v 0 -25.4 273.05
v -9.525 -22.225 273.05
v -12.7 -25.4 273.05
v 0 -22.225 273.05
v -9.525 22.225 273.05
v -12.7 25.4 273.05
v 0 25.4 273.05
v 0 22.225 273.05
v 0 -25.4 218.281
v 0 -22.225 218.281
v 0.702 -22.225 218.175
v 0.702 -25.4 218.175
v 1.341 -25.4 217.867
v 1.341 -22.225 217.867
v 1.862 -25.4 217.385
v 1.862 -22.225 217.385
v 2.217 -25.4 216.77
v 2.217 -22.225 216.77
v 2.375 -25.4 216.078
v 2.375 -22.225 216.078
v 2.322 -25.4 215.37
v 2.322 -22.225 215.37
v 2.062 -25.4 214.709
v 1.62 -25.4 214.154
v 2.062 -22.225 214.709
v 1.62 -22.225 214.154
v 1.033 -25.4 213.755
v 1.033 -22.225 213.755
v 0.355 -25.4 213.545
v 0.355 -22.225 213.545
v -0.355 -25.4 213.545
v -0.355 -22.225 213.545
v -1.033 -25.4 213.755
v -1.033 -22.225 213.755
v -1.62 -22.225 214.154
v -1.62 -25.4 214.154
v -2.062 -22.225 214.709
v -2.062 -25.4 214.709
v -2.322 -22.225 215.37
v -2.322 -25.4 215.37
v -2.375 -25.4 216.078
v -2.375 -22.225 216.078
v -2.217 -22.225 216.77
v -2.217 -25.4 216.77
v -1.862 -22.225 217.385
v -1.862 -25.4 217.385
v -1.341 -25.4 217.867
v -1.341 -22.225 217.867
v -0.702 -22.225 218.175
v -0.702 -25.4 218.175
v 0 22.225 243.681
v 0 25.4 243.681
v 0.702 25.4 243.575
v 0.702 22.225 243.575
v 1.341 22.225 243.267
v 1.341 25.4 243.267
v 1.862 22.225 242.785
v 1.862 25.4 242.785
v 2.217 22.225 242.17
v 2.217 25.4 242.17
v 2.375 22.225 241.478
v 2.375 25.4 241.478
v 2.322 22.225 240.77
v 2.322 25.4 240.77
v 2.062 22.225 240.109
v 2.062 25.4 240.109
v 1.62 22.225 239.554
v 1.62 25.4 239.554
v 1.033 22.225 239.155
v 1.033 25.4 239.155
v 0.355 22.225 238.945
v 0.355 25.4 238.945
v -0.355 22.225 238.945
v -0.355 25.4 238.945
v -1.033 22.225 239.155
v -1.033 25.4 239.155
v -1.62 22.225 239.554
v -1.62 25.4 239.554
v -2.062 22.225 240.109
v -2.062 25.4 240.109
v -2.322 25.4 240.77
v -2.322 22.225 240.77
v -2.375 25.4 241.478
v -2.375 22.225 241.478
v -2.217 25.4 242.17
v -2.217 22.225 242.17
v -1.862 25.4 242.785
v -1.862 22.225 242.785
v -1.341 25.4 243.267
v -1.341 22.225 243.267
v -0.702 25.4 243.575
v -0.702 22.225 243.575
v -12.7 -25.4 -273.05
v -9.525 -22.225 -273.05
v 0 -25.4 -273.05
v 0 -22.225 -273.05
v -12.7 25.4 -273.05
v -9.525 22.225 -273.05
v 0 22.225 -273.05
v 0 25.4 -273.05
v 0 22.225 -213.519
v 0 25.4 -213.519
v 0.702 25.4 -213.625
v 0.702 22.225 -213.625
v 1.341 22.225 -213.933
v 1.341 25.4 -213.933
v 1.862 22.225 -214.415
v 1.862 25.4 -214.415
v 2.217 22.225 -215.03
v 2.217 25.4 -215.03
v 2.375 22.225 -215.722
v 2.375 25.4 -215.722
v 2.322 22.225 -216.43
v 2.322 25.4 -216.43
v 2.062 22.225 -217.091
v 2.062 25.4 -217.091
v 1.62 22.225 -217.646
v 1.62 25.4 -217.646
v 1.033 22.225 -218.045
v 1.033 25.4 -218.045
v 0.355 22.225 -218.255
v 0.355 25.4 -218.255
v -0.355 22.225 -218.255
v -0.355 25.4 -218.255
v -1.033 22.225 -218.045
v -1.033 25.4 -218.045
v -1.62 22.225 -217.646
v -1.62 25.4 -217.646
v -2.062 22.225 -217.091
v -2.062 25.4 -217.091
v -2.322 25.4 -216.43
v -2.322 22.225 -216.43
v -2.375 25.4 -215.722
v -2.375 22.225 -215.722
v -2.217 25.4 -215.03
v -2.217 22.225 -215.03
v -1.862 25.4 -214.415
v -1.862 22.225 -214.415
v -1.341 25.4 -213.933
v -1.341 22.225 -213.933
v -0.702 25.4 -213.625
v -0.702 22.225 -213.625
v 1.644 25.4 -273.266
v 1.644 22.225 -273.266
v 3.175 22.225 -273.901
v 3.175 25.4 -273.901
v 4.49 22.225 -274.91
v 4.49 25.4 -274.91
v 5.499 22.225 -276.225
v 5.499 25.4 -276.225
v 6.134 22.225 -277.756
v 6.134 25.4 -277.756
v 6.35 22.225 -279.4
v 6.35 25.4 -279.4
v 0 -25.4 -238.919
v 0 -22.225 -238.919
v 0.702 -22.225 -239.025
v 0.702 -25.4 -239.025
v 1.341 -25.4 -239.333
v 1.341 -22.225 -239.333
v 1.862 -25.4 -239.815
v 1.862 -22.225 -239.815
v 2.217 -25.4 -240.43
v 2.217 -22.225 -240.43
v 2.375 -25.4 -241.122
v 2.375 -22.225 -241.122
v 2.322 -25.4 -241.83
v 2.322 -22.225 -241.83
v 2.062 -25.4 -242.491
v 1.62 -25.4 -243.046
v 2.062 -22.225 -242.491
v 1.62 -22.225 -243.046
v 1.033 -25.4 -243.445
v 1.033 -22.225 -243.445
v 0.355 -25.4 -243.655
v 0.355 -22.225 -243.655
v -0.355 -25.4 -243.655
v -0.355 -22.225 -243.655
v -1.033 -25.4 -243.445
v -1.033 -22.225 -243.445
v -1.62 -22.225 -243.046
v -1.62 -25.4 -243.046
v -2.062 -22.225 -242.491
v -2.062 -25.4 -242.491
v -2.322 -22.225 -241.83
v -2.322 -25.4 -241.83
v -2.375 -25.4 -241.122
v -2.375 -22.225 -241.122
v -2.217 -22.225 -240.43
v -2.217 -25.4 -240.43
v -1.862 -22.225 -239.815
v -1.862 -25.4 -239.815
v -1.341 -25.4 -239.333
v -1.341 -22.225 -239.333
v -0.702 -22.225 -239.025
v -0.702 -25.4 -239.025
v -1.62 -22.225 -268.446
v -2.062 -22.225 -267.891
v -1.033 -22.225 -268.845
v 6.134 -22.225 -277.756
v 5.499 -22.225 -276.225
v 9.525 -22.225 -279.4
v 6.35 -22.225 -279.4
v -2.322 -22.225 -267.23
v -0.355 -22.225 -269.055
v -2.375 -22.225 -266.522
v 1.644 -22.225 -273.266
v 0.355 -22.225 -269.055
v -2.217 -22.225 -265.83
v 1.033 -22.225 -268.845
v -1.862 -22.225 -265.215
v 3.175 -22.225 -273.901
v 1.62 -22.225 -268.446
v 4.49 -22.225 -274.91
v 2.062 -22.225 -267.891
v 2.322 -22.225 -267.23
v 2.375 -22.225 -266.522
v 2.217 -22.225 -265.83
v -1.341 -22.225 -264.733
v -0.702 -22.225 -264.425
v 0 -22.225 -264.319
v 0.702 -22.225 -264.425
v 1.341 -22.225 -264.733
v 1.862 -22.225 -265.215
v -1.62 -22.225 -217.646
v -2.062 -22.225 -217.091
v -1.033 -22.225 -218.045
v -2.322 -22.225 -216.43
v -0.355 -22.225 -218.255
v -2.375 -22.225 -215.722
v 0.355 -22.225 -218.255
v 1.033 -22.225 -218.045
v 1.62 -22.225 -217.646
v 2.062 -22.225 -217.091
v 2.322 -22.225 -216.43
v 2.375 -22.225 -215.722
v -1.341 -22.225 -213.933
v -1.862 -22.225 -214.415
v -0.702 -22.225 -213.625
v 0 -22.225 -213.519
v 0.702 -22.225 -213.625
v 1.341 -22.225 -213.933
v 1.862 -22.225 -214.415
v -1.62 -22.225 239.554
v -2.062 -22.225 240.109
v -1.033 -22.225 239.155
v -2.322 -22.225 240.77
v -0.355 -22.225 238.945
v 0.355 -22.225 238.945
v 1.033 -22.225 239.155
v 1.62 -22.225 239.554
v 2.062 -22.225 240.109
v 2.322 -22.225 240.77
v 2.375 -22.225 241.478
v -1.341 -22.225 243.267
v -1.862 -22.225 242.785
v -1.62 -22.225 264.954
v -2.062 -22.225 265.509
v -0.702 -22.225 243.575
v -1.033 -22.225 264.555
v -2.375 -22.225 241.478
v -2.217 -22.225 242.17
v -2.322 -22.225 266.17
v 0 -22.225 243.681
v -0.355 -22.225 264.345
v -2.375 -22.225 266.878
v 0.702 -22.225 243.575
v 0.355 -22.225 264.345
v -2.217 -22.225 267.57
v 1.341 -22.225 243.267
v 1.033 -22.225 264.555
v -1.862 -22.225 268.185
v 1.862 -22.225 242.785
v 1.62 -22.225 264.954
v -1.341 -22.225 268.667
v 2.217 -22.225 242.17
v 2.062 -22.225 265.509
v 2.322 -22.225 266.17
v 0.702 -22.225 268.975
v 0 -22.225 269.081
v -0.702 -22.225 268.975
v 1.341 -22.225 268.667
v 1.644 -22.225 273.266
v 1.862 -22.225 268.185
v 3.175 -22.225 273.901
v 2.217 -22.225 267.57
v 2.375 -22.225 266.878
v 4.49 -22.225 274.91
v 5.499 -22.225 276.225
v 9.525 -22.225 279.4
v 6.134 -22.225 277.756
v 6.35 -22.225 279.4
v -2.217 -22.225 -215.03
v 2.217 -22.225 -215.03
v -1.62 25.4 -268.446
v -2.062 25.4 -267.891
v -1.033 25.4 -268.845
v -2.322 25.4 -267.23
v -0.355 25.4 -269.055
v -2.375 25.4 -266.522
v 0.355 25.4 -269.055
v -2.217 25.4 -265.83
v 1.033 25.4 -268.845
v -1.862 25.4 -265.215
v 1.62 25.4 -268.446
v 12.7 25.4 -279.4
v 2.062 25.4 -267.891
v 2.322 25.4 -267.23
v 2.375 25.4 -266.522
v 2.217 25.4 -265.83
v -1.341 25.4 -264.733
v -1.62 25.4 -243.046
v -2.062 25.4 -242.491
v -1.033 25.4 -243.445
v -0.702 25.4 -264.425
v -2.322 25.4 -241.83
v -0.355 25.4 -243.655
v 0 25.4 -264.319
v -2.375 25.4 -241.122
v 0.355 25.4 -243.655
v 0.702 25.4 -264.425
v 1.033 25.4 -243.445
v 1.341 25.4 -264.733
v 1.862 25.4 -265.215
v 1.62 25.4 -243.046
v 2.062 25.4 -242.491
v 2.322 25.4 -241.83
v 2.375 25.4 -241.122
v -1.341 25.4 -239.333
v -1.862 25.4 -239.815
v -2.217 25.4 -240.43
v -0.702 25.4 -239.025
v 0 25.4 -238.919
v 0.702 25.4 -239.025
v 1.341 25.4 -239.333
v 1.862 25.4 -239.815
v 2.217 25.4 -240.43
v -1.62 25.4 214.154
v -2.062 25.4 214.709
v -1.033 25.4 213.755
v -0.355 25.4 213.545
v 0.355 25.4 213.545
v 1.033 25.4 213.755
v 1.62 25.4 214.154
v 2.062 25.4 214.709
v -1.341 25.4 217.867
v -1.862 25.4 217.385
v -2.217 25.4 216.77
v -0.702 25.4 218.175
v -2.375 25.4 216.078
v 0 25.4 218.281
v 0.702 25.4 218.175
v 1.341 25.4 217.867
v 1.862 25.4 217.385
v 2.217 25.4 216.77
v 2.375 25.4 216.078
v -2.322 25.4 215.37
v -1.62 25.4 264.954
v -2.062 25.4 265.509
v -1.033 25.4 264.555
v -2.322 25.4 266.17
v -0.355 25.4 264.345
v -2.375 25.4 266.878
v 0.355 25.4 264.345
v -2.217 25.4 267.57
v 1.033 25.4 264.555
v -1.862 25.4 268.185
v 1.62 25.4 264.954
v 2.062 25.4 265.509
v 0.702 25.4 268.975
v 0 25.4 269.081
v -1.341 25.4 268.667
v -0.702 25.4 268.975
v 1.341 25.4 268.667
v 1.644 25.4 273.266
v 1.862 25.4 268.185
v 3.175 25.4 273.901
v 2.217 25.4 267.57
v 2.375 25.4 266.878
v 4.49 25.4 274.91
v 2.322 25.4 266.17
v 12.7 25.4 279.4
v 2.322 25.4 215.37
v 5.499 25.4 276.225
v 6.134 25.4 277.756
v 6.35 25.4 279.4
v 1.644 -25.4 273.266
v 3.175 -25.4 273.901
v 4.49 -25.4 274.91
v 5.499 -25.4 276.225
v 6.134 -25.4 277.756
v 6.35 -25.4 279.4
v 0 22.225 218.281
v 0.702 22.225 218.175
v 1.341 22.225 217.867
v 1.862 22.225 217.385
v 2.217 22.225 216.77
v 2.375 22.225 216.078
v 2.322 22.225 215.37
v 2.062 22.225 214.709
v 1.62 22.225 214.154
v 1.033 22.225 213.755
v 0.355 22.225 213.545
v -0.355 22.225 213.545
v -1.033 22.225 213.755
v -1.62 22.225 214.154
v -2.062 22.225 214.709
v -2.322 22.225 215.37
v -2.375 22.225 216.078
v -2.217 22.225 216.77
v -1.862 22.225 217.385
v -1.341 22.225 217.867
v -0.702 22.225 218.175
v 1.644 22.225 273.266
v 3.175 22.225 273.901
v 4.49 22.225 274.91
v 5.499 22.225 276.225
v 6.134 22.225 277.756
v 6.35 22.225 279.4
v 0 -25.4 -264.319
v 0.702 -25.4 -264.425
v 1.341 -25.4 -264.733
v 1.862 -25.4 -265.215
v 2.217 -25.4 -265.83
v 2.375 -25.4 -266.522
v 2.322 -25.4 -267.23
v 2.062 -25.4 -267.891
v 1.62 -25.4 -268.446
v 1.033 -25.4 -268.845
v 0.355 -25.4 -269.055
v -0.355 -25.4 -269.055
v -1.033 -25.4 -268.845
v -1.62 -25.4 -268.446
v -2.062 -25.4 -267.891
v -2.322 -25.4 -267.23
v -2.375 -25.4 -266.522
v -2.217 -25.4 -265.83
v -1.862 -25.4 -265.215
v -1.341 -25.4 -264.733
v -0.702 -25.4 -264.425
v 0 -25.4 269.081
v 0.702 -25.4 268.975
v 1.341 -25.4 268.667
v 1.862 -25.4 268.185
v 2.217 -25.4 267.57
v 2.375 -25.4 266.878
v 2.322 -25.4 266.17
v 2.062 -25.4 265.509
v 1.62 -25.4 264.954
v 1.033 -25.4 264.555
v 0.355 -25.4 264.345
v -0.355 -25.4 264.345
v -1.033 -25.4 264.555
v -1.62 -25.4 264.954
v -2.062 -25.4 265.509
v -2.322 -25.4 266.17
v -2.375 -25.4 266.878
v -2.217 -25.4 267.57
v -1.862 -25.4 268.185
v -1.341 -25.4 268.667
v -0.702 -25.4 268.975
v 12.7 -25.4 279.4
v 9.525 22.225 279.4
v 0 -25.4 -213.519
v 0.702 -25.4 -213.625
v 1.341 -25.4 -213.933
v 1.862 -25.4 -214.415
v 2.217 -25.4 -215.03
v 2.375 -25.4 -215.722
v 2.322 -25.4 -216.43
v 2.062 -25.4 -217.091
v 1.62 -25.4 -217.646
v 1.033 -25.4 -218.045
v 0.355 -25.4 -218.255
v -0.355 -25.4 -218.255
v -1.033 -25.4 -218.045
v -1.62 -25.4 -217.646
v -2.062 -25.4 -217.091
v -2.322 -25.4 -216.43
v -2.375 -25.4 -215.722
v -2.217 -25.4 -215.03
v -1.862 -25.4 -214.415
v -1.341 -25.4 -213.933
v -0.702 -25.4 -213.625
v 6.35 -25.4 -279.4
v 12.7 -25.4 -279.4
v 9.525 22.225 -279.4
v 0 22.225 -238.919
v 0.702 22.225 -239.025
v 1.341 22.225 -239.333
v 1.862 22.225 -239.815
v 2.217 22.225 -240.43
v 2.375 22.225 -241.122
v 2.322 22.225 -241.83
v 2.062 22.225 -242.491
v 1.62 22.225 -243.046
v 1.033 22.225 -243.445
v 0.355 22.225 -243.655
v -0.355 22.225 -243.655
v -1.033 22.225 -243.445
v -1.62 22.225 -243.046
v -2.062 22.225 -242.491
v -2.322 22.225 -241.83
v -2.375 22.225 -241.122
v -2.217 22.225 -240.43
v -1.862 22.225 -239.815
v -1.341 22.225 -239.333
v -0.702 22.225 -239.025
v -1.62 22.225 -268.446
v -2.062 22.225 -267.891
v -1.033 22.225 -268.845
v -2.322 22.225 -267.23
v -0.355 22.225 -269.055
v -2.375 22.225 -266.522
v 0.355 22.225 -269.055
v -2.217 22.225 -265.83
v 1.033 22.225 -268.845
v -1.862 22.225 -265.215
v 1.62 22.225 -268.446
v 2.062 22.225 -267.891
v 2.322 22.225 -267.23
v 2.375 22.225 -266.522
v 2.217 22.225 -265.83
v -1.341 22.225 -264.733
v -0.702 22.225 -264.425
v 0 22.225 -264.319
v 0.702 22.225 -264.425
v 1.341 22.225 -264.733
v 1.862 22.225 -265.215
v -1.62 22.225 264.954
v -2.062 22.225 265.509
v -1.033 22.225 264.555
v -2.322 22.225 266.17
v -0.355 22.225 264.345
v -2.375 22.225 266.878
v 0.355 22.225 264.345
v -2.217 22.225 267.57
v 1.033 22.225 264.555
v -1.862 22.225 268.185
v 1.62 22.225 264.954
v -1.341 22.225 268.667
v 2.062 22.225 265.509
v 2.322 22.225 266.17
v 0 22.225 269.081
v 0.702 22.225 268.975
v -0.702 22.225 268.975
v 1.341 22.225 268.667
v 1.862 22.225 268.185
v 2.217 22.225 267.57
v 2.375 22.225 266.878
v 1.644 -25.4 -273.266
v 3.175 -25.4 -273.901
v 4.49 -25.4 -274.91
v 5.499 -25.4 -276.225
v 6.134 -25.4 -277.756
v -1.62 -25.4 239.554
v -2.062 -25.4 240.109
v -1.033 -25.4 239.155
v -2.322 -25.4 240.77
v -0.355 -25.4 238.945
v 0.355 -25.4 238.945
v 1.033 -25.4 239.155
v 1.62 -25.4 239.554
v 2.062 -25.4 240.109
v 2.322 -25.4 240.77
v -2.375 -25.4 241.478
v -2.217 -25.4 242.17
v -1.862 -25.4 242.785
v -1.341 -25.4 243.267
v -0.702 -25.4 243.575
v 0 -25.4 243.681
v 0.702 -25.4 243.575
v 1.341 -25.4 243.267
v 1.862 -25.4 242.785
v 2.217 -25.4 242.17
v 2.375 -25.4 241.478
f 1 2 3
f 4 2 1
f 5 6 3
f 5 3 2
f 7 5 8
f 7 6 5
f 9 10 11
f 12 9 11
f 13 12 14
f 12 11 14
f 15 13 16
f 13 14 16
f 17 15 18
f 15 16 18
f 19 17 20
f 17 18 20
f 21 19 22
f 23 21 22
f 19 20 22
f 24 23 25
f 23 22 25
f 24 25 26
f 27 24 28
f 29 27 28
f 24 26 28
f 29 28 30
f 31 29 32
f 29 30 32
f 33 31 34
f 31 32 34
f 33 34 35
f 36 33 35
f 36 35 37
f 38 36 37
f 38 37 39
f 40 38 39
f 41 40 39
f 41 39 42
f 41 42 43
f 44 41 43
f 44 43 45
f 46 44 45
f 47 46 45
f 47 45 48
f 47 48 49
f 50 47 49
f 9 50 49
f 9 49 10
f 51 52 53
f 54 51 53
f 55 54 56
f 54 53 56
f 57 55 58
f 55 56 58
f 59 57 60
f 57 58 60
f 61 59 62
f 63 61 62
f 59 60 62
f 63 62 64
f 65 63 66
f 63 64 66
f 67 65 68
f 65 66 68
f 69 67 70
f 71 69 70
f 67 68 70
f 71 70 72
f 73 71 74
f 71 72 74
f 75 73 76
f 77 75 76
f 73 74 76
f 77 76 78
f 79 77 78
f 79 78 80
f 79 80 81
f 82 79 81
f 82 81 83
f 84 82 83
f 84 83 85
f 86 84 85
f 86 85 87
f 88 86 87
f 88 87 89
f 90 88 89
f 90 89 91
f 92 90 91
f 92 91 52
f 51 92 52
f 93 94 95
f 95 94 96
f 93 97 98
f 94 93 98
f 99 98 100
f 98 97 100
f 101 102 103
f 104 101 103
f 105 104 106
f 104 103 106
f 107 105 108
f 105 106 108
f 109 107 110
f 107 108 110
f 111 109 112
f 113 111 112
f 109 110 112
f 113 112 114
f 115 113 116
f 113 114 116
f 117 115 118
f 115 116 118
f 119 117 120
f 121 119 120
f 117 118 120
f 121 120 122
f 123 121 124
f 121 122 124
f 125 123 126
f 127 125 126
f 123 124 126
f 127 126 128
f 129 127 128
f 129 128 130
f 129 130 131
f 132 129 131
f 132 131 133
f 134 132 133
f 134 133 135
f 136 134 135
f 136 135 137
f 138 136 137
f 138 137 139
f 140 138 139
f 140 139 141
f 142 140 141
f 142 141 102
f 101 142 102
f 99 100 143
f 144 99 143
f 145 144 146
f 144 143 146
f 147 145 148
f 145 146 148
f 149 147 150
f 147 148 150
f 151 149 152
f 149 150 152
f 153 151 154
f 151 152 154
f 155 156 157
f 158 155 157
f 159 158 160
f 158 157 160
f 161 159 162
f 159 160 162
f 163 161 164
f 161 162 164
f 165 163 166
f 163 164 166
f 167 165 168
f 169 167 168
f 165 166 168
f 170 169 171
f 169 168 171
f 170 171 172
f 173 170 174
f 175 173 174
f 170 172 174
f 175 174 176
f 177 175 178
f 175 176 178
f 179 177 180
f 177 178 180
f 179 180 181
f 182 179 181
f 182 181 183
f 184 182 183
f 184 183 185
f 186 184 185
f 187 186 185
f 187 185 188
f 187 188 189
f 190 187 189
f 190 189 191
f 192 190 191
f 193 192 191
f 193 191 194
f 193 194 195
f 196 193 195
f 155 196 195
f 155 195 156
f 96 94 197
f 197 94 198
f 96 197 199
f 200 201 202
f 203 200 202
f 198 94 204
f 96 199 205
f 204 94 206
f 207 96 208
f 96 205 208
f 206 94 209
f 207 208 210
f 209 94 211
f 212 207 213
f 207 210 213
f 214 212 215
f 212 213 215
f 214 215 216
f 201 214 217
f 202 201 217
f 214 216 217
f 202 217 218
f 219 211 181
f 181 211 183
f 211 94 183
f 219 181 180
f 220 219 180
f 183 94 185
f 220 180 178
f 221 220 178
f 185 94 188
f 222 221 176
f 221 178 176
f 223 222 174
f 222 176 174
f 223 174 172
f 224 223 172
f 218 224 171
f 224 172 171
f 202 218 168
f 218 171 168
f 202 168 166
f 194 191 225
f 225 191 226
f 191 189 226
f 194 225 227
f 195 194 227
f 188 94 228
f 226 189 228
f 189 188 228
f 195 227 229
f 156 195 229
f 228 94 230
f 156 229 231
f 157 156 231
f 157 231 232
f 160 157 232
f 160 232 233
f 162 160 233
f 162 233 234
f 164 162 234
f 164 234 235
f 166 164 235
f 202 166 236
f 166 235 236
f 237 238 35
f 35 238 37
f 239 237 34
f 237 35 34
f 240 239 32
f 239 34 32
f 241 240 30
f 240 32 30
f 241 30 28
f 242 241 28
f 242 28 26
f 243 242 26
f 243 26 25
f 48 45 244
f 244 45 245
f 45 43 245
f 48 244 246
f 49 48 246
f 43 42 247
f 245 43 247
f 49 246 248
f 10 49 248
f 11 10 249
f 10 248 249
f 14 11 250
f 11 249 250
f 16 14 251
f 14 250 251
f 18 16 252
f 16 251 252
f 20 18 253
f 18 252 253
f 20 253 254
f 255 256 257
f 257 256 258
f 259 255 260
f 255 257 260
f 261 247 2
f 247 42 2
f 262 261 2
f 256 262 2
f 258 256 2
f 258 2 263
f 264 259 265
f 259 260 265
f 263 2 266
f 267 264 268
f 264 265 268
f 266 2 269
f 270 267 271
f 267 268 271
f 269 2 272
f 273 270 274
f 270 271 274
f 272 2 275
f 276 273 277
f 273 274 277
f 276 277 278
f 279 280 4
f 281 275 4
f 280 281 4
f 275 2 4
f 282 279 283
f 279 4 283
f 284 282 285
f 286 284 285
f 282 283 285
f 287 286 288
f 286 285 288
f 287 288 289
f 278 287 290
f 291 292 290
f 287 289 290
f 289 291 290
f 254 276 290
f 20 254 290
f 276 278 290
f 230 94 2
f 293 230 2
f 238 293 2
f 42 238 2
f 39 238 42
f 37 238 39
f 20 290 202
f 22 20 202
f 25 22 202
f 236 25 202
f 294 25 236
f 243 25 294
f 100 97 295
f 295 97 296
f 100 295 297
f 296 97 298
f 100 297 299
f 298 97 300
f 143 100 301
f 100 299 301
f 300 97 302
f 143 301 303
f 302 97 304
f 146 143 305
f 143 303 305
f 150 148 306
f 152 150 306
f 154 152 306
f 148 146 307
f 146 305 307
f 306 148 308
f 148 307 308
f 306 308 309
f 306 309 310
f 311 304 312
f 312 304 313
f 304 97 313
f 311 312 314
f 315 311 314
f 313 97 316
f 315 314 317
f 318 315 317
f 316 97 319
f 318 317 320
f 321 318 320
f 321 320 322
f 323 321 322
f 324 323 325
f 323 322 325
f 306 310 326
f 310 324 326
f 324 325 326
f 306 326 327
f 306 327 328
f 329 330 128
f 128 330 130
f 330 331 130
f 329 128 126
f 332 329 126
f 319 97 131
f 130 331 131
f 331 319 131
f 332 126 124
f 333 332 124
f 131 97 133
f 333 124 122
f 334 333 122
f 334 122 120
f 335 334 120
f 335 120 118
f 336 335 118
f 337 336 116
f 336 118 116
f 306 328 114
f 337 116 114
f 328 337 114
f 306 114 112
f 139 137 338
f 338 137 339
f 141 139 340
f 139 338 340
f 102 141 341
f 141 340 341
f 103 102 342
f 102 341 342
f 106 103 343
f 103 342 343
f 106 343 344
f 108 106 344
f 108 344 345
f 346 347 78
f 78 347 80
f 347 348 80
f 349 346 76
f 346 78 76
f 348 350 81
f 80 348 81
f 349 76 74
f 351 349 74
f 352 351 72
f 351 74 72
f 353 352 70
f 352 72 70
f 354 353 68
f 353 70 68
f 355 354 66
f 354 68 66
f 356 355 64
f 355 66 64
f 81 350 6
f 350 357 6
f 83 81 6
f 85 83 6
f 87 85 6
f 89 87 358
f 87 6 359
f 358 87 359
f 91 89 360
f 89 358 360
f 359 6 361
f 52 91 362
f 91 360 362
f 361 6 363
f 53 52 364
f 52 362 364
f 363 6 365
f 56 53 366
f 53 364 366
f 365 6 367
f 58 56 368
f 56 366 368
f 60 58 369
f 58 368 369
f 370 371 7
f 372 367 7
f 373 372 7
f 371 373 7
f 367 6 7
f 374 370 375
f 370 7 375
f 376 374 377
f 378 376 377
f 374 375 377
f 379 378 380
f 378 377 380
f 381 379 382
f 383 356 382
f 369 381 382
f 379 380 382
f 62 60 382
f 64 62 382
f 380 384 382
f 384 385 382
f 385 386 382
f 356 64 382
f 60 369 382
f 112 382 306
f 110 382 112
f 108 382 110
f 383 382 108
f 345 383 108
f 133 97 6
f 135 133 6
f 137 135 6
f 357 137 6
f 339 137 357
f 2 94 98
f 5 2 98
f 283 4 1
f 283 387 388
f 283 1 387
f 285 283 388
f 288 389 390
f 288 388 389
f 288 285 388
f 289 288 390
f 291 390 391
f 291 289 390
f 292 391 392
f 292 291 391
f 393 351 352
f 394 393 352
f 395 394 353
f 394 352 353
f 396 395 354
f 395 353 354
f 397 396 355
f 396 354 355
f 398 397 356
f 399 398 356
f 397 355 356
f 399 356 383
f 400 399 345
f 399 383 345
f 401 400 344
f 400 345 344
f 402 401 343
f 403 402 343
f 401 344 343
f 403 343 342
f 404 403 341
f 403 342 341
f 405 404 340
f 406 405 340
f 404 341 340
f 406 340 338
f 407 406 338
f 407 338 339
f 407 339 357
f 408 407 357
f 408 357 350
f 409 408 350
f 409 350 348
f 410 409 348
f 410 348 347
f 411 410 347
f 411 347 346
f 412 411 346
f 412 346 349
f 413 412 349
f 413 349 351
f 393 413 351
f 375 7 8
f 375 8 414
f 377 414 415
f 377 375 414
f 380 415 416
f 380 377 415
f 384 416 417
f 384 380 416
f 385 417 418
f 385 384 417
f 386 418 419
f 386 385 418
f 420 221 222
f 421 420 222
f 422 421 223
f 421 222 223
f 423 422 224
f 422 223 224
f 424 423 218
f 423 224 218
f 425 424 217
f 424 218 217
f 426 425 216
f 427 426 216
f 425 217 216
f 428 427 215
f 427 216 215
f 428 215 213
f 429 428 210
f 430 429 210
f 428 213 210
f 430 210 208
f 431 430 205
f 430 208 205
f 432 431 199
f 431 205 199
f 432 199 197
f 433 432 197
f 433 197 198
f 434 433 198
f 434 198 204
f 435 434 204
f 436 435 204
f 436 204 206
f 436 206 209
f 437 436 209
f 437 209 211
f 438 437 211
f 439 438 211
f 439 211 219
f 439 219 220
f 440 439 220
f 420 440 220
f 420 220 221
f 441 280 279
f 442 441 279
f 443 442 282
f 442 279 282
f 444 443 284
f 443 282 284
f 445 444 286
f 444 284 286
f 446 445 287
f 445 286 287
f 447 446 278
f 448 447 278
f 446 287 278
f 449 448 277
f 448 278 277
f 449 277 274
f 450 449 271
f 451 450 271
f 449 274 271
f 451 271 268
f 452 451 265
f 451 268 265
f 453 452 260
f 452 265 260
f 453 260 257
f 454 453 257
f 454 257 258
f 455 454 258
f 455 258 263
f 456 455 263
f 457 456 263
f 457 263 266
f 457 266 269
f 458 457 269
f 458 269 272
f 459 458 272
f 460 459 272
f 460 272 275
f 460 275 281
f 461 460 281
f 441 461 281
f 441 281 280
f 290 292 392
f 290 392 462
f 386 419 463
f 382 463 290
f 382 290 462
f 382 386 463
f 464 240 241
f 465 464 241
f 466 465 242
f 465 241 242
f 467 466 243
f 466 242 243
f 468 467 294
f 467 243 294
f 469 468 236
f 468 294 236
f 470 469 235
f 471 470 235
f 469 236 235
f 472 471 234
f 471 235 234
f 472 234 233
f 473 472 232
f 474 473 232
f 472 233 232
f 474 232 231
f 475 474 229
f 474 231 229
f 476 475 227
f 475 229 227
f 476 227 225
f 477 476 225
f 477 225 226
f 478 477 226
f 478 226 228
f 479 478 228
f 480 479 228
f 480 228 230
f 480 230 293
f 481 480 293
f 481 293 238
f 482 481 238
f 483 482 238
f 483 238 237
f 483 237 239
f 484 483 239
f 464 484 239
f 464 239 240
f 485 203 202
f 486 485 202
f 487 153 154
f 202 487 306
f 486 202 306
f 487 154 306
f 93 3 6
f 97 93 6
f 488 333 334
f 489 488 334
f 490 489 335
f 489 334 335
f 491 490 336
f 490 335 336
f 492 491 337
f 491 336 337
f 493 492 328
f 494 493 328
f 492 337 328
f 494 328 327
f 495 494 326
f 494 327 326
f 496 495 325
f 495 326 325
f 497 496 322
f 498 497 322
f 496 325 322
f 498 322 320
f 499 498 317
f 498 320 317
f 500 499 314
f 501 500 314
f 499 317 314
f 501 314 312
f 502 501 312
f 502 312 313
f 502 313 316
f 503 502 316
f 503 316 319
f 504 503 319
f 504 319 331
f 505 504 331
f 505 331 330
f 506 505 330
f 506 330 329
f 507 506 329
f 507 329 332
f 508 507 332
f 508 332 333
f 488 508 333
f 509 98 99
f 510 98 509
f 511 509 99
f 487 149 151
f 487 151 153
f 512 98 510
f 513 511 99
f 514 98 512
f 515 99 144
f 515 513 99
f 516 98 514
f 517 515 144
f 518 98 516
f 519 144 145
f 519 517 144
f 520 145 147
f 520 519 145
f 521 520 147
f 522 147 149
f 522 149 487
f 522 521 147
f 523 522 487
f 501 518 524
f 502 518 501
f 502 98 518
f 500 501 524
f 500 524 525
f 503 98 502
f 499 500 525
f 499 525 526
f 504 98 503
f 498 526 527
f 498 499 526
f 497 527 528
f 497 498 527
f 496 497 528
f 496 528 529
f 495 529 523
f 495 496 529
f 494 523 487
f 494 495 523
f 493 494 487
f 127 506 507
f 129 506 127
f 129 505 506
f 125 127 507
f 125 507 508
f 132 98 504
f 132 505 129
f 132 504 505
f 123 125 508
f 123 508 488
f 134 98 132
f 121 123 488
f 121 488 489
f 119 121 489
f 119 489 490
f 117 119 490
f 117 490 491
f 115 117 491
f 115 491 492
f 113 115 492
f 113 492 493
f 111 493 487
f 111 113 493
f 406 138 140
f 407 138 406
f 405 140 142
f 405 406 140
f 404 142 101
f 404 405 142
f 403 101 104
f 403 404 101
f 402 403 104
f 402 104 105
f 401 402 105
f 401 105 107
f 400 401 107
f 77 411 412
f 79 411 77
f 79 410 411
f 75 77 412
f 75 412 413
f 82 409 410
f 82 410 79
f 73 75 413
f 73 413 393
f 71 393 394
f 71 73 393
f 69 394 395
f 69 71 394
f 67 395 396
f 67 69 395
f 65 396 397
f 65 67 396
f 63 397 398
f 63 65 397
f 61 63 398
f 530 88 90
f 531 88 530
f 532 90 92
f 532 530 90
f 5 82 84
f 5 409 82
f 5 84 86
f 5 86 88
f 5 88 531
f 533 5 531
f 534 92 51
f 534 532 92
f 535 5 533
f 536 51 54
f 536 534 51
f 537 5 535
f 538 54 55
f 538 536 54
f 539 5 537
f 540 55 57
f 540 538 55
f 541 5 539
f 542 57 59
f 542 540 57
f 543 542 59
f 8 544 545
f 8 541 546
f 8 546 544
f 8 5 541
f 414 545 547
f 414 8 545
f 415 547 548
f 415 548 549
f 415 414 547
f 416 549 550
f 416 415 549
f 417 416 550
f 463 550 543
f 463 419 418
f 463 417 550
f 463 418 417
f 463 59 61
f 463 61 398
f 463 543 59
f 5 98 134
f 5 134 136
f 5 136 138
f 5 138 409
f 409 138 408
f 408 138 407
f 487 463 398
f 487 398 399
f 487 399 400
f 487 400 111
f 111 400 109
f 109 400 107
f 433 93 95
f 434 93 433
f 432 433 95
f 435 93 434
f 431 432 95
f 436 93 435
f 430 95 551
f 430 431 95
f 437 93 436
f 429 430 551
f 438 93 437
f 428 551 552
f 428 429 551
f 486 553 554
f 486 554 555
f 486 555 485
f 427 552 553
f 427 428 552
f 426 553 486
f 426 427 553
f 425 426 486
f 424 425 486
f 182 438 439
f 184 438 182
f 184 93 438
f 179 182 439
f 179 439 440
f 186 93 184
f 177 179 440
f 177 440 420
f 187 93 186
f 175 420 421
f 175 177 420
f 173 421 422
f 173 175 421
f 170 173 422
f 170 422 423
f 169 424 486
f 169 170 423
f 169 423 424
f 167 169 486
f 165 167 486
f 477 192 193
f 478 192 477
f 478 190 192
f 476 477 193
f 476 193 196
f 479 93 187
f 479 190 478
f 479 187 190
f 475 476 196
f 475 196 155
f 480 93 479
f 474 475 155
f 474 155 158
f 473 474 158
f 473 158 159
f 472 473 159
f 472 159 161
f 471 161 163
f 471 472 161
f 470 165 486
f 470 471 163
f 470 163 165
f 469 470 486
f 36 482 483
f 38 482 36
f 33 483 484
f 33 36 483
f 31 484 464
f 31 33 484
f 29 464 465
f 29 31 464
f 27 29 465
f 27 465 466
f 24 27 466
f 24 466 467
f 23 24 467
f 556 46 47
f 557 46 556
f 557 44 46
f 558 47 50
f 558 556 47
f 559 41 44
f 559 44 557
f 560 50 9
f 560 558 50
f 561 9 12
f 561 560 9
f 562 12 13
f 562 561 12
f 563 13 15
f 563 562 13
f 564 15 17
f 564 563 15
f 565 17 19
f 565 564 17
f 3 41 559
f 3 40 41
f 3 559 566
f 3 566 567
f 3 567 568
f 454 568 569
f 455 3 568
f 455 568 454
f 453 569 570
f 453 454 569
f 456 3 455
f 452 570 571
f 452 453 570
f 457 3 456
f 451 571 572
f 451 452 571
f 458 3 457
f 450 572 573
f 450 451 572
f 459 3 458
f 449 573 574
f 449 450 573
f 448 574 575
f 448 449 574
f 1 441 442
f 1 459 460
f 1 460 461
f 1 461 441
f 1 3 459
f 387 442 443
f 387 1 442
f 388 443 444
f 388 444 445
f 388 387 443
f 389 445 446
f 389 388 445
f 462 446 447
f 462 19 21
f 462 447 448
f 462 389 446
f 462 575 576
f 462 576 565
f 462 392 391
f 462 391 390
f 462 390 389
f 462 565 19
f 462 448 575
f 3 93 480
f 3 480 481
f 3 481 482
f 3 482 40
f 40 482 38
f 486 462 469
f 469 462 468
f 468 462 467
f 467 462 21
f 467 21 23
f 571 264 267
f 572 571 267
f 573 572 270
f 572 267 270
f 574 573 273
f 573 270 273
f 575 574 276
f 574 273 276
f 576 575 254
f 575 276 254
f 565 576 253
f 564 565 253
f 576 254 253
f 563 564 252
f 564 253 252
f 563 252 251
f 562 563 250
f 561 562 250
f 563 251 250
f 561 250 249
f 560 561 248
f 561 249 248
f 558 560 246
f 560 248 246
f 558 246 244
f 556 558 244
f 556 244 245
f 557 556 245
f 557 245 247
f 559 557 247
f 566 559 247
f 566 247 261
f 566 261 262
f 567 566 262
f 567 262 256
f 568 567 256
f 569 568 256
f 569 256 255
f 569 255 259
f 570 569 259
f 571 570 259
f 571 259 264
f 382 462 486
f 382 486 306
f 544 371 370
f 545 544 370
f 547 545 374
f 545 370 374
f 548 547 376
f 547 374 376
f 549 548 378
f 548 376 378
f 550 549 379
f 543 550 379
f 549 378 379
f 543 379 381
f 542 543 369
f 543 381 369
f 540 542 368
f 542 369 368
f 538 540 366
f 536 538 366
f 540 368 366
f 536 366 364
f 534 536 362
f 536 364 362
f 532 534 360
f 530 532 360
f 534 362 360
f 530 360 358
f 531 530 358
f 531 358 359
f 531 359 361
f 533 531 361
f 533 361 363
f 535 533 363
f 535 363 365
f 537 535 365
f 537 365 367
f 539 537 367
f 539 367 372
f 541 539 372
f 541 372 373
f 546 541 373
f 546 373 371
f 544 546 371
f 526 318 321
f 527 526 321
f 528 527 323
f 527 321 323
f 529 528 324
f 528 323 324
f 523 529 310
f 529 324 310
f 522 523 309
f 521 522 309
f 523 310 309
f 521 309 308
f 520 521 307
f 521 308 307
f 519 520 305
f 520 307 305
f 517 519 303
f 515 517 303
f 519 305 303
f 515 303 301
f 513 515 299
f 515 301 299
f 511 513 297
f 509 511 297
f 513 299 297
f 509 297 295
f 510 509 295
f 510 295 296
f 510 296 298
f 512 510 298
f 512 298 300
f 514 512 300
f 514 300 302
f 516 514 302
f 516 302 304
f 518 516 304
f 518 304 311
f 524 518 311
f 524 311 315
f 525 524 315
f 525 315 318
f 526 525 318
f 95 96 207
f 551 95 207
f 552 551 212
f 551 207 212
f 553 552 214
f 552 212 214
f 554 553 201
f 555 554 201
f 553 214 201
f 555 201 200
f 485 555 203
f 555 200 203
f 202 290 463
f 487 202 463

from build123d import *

# Parameters (mm, degrees)
SKETCH1_W           = 25.4
SKETCH1_H           = 50.8
BOSS_EXTRUDE1_DEPTH = 279.4
SHELL1_T            = -3.175
SKETCH3_R           = 2.38125
CUT_EXTRUDE1_DEPTH  = 285.264471927


with BuildPart() as part:
    # Sketch1 → Boss-Extrude1 (new, symmetric)
    with BuildSketch(Plane.XY):
        Rectangle(SKETCH1_W, SKETCH1_H)
    extrude(amount=BOSS_EXTRUDE1_DEPTH, both=True)

    # Shell1
    shell1_openings = [part.faces().sort_by_distance(p)[0] for p in [
        (0, 0, 279.4),
        (0, 0, -279.4),
    ]]
    offset(amount=SHELL1_T, openings=shell1_openings, kind=Kind.INTERSECTION)

    # Sketch3 → Cut-Extrude1 (cut, through all)
    with BuildSketch(Plane(origin=(0, 25.4, 0), x_dir=(1, 0, 0), z_dir=(0, 1, 0))):
        with Locations(Location((0, 266.7, 0), (0, 0, 270))):
            Circle(SKETCH3_R)
        with Locations(Location((0, 241.3, 0), (0, 0, 270))):
            Circle(SKETCH3_R)
        with Locations(Location((0, 215.9, 0), (0, 0, 270))):
            Circle(SKETCH3_R)
        with Locations(Location((0, -215.9, 0), (0, 0, 270))):
            Circle(SKETCH3_R)
        with Locations(Location((0, -241.3, 0), (0, 0, 270))):
            Circle(SKETCH3_R)
        with Locations(Location((0, -266.7, 0), (0, 0, 270))):
            Circle(SKETCH3_R)
        with BuildLine():
            Line((6.35, 279.4), (-12.7, 279.4))
            Line((-12.7, 279.4), (-12.7, 273.05))
            Line((-12.7, 273.05), (0, 273.05))
            ThreePointArc((0, 273.05), (4.490128061, 274.909871939), (6.35, 279.4))
        make_face()
        with BuildLine():
            Line((-12.7, -273.05), (0, -273.05))
            ThreePointArc((0, -273.05), (4.490128061, -274.909871939), (6.35, -279.4))
            Line((6.35, -279.4), (-12.7, -279.4))
            Line((-12.7, -279.4), (-12.7, -273.05))
        make_face()
    extrude(amount=-CUT_EXTRUDE1_DEPTH, mode=Mode.SUBTRACT)


solid = part.part
